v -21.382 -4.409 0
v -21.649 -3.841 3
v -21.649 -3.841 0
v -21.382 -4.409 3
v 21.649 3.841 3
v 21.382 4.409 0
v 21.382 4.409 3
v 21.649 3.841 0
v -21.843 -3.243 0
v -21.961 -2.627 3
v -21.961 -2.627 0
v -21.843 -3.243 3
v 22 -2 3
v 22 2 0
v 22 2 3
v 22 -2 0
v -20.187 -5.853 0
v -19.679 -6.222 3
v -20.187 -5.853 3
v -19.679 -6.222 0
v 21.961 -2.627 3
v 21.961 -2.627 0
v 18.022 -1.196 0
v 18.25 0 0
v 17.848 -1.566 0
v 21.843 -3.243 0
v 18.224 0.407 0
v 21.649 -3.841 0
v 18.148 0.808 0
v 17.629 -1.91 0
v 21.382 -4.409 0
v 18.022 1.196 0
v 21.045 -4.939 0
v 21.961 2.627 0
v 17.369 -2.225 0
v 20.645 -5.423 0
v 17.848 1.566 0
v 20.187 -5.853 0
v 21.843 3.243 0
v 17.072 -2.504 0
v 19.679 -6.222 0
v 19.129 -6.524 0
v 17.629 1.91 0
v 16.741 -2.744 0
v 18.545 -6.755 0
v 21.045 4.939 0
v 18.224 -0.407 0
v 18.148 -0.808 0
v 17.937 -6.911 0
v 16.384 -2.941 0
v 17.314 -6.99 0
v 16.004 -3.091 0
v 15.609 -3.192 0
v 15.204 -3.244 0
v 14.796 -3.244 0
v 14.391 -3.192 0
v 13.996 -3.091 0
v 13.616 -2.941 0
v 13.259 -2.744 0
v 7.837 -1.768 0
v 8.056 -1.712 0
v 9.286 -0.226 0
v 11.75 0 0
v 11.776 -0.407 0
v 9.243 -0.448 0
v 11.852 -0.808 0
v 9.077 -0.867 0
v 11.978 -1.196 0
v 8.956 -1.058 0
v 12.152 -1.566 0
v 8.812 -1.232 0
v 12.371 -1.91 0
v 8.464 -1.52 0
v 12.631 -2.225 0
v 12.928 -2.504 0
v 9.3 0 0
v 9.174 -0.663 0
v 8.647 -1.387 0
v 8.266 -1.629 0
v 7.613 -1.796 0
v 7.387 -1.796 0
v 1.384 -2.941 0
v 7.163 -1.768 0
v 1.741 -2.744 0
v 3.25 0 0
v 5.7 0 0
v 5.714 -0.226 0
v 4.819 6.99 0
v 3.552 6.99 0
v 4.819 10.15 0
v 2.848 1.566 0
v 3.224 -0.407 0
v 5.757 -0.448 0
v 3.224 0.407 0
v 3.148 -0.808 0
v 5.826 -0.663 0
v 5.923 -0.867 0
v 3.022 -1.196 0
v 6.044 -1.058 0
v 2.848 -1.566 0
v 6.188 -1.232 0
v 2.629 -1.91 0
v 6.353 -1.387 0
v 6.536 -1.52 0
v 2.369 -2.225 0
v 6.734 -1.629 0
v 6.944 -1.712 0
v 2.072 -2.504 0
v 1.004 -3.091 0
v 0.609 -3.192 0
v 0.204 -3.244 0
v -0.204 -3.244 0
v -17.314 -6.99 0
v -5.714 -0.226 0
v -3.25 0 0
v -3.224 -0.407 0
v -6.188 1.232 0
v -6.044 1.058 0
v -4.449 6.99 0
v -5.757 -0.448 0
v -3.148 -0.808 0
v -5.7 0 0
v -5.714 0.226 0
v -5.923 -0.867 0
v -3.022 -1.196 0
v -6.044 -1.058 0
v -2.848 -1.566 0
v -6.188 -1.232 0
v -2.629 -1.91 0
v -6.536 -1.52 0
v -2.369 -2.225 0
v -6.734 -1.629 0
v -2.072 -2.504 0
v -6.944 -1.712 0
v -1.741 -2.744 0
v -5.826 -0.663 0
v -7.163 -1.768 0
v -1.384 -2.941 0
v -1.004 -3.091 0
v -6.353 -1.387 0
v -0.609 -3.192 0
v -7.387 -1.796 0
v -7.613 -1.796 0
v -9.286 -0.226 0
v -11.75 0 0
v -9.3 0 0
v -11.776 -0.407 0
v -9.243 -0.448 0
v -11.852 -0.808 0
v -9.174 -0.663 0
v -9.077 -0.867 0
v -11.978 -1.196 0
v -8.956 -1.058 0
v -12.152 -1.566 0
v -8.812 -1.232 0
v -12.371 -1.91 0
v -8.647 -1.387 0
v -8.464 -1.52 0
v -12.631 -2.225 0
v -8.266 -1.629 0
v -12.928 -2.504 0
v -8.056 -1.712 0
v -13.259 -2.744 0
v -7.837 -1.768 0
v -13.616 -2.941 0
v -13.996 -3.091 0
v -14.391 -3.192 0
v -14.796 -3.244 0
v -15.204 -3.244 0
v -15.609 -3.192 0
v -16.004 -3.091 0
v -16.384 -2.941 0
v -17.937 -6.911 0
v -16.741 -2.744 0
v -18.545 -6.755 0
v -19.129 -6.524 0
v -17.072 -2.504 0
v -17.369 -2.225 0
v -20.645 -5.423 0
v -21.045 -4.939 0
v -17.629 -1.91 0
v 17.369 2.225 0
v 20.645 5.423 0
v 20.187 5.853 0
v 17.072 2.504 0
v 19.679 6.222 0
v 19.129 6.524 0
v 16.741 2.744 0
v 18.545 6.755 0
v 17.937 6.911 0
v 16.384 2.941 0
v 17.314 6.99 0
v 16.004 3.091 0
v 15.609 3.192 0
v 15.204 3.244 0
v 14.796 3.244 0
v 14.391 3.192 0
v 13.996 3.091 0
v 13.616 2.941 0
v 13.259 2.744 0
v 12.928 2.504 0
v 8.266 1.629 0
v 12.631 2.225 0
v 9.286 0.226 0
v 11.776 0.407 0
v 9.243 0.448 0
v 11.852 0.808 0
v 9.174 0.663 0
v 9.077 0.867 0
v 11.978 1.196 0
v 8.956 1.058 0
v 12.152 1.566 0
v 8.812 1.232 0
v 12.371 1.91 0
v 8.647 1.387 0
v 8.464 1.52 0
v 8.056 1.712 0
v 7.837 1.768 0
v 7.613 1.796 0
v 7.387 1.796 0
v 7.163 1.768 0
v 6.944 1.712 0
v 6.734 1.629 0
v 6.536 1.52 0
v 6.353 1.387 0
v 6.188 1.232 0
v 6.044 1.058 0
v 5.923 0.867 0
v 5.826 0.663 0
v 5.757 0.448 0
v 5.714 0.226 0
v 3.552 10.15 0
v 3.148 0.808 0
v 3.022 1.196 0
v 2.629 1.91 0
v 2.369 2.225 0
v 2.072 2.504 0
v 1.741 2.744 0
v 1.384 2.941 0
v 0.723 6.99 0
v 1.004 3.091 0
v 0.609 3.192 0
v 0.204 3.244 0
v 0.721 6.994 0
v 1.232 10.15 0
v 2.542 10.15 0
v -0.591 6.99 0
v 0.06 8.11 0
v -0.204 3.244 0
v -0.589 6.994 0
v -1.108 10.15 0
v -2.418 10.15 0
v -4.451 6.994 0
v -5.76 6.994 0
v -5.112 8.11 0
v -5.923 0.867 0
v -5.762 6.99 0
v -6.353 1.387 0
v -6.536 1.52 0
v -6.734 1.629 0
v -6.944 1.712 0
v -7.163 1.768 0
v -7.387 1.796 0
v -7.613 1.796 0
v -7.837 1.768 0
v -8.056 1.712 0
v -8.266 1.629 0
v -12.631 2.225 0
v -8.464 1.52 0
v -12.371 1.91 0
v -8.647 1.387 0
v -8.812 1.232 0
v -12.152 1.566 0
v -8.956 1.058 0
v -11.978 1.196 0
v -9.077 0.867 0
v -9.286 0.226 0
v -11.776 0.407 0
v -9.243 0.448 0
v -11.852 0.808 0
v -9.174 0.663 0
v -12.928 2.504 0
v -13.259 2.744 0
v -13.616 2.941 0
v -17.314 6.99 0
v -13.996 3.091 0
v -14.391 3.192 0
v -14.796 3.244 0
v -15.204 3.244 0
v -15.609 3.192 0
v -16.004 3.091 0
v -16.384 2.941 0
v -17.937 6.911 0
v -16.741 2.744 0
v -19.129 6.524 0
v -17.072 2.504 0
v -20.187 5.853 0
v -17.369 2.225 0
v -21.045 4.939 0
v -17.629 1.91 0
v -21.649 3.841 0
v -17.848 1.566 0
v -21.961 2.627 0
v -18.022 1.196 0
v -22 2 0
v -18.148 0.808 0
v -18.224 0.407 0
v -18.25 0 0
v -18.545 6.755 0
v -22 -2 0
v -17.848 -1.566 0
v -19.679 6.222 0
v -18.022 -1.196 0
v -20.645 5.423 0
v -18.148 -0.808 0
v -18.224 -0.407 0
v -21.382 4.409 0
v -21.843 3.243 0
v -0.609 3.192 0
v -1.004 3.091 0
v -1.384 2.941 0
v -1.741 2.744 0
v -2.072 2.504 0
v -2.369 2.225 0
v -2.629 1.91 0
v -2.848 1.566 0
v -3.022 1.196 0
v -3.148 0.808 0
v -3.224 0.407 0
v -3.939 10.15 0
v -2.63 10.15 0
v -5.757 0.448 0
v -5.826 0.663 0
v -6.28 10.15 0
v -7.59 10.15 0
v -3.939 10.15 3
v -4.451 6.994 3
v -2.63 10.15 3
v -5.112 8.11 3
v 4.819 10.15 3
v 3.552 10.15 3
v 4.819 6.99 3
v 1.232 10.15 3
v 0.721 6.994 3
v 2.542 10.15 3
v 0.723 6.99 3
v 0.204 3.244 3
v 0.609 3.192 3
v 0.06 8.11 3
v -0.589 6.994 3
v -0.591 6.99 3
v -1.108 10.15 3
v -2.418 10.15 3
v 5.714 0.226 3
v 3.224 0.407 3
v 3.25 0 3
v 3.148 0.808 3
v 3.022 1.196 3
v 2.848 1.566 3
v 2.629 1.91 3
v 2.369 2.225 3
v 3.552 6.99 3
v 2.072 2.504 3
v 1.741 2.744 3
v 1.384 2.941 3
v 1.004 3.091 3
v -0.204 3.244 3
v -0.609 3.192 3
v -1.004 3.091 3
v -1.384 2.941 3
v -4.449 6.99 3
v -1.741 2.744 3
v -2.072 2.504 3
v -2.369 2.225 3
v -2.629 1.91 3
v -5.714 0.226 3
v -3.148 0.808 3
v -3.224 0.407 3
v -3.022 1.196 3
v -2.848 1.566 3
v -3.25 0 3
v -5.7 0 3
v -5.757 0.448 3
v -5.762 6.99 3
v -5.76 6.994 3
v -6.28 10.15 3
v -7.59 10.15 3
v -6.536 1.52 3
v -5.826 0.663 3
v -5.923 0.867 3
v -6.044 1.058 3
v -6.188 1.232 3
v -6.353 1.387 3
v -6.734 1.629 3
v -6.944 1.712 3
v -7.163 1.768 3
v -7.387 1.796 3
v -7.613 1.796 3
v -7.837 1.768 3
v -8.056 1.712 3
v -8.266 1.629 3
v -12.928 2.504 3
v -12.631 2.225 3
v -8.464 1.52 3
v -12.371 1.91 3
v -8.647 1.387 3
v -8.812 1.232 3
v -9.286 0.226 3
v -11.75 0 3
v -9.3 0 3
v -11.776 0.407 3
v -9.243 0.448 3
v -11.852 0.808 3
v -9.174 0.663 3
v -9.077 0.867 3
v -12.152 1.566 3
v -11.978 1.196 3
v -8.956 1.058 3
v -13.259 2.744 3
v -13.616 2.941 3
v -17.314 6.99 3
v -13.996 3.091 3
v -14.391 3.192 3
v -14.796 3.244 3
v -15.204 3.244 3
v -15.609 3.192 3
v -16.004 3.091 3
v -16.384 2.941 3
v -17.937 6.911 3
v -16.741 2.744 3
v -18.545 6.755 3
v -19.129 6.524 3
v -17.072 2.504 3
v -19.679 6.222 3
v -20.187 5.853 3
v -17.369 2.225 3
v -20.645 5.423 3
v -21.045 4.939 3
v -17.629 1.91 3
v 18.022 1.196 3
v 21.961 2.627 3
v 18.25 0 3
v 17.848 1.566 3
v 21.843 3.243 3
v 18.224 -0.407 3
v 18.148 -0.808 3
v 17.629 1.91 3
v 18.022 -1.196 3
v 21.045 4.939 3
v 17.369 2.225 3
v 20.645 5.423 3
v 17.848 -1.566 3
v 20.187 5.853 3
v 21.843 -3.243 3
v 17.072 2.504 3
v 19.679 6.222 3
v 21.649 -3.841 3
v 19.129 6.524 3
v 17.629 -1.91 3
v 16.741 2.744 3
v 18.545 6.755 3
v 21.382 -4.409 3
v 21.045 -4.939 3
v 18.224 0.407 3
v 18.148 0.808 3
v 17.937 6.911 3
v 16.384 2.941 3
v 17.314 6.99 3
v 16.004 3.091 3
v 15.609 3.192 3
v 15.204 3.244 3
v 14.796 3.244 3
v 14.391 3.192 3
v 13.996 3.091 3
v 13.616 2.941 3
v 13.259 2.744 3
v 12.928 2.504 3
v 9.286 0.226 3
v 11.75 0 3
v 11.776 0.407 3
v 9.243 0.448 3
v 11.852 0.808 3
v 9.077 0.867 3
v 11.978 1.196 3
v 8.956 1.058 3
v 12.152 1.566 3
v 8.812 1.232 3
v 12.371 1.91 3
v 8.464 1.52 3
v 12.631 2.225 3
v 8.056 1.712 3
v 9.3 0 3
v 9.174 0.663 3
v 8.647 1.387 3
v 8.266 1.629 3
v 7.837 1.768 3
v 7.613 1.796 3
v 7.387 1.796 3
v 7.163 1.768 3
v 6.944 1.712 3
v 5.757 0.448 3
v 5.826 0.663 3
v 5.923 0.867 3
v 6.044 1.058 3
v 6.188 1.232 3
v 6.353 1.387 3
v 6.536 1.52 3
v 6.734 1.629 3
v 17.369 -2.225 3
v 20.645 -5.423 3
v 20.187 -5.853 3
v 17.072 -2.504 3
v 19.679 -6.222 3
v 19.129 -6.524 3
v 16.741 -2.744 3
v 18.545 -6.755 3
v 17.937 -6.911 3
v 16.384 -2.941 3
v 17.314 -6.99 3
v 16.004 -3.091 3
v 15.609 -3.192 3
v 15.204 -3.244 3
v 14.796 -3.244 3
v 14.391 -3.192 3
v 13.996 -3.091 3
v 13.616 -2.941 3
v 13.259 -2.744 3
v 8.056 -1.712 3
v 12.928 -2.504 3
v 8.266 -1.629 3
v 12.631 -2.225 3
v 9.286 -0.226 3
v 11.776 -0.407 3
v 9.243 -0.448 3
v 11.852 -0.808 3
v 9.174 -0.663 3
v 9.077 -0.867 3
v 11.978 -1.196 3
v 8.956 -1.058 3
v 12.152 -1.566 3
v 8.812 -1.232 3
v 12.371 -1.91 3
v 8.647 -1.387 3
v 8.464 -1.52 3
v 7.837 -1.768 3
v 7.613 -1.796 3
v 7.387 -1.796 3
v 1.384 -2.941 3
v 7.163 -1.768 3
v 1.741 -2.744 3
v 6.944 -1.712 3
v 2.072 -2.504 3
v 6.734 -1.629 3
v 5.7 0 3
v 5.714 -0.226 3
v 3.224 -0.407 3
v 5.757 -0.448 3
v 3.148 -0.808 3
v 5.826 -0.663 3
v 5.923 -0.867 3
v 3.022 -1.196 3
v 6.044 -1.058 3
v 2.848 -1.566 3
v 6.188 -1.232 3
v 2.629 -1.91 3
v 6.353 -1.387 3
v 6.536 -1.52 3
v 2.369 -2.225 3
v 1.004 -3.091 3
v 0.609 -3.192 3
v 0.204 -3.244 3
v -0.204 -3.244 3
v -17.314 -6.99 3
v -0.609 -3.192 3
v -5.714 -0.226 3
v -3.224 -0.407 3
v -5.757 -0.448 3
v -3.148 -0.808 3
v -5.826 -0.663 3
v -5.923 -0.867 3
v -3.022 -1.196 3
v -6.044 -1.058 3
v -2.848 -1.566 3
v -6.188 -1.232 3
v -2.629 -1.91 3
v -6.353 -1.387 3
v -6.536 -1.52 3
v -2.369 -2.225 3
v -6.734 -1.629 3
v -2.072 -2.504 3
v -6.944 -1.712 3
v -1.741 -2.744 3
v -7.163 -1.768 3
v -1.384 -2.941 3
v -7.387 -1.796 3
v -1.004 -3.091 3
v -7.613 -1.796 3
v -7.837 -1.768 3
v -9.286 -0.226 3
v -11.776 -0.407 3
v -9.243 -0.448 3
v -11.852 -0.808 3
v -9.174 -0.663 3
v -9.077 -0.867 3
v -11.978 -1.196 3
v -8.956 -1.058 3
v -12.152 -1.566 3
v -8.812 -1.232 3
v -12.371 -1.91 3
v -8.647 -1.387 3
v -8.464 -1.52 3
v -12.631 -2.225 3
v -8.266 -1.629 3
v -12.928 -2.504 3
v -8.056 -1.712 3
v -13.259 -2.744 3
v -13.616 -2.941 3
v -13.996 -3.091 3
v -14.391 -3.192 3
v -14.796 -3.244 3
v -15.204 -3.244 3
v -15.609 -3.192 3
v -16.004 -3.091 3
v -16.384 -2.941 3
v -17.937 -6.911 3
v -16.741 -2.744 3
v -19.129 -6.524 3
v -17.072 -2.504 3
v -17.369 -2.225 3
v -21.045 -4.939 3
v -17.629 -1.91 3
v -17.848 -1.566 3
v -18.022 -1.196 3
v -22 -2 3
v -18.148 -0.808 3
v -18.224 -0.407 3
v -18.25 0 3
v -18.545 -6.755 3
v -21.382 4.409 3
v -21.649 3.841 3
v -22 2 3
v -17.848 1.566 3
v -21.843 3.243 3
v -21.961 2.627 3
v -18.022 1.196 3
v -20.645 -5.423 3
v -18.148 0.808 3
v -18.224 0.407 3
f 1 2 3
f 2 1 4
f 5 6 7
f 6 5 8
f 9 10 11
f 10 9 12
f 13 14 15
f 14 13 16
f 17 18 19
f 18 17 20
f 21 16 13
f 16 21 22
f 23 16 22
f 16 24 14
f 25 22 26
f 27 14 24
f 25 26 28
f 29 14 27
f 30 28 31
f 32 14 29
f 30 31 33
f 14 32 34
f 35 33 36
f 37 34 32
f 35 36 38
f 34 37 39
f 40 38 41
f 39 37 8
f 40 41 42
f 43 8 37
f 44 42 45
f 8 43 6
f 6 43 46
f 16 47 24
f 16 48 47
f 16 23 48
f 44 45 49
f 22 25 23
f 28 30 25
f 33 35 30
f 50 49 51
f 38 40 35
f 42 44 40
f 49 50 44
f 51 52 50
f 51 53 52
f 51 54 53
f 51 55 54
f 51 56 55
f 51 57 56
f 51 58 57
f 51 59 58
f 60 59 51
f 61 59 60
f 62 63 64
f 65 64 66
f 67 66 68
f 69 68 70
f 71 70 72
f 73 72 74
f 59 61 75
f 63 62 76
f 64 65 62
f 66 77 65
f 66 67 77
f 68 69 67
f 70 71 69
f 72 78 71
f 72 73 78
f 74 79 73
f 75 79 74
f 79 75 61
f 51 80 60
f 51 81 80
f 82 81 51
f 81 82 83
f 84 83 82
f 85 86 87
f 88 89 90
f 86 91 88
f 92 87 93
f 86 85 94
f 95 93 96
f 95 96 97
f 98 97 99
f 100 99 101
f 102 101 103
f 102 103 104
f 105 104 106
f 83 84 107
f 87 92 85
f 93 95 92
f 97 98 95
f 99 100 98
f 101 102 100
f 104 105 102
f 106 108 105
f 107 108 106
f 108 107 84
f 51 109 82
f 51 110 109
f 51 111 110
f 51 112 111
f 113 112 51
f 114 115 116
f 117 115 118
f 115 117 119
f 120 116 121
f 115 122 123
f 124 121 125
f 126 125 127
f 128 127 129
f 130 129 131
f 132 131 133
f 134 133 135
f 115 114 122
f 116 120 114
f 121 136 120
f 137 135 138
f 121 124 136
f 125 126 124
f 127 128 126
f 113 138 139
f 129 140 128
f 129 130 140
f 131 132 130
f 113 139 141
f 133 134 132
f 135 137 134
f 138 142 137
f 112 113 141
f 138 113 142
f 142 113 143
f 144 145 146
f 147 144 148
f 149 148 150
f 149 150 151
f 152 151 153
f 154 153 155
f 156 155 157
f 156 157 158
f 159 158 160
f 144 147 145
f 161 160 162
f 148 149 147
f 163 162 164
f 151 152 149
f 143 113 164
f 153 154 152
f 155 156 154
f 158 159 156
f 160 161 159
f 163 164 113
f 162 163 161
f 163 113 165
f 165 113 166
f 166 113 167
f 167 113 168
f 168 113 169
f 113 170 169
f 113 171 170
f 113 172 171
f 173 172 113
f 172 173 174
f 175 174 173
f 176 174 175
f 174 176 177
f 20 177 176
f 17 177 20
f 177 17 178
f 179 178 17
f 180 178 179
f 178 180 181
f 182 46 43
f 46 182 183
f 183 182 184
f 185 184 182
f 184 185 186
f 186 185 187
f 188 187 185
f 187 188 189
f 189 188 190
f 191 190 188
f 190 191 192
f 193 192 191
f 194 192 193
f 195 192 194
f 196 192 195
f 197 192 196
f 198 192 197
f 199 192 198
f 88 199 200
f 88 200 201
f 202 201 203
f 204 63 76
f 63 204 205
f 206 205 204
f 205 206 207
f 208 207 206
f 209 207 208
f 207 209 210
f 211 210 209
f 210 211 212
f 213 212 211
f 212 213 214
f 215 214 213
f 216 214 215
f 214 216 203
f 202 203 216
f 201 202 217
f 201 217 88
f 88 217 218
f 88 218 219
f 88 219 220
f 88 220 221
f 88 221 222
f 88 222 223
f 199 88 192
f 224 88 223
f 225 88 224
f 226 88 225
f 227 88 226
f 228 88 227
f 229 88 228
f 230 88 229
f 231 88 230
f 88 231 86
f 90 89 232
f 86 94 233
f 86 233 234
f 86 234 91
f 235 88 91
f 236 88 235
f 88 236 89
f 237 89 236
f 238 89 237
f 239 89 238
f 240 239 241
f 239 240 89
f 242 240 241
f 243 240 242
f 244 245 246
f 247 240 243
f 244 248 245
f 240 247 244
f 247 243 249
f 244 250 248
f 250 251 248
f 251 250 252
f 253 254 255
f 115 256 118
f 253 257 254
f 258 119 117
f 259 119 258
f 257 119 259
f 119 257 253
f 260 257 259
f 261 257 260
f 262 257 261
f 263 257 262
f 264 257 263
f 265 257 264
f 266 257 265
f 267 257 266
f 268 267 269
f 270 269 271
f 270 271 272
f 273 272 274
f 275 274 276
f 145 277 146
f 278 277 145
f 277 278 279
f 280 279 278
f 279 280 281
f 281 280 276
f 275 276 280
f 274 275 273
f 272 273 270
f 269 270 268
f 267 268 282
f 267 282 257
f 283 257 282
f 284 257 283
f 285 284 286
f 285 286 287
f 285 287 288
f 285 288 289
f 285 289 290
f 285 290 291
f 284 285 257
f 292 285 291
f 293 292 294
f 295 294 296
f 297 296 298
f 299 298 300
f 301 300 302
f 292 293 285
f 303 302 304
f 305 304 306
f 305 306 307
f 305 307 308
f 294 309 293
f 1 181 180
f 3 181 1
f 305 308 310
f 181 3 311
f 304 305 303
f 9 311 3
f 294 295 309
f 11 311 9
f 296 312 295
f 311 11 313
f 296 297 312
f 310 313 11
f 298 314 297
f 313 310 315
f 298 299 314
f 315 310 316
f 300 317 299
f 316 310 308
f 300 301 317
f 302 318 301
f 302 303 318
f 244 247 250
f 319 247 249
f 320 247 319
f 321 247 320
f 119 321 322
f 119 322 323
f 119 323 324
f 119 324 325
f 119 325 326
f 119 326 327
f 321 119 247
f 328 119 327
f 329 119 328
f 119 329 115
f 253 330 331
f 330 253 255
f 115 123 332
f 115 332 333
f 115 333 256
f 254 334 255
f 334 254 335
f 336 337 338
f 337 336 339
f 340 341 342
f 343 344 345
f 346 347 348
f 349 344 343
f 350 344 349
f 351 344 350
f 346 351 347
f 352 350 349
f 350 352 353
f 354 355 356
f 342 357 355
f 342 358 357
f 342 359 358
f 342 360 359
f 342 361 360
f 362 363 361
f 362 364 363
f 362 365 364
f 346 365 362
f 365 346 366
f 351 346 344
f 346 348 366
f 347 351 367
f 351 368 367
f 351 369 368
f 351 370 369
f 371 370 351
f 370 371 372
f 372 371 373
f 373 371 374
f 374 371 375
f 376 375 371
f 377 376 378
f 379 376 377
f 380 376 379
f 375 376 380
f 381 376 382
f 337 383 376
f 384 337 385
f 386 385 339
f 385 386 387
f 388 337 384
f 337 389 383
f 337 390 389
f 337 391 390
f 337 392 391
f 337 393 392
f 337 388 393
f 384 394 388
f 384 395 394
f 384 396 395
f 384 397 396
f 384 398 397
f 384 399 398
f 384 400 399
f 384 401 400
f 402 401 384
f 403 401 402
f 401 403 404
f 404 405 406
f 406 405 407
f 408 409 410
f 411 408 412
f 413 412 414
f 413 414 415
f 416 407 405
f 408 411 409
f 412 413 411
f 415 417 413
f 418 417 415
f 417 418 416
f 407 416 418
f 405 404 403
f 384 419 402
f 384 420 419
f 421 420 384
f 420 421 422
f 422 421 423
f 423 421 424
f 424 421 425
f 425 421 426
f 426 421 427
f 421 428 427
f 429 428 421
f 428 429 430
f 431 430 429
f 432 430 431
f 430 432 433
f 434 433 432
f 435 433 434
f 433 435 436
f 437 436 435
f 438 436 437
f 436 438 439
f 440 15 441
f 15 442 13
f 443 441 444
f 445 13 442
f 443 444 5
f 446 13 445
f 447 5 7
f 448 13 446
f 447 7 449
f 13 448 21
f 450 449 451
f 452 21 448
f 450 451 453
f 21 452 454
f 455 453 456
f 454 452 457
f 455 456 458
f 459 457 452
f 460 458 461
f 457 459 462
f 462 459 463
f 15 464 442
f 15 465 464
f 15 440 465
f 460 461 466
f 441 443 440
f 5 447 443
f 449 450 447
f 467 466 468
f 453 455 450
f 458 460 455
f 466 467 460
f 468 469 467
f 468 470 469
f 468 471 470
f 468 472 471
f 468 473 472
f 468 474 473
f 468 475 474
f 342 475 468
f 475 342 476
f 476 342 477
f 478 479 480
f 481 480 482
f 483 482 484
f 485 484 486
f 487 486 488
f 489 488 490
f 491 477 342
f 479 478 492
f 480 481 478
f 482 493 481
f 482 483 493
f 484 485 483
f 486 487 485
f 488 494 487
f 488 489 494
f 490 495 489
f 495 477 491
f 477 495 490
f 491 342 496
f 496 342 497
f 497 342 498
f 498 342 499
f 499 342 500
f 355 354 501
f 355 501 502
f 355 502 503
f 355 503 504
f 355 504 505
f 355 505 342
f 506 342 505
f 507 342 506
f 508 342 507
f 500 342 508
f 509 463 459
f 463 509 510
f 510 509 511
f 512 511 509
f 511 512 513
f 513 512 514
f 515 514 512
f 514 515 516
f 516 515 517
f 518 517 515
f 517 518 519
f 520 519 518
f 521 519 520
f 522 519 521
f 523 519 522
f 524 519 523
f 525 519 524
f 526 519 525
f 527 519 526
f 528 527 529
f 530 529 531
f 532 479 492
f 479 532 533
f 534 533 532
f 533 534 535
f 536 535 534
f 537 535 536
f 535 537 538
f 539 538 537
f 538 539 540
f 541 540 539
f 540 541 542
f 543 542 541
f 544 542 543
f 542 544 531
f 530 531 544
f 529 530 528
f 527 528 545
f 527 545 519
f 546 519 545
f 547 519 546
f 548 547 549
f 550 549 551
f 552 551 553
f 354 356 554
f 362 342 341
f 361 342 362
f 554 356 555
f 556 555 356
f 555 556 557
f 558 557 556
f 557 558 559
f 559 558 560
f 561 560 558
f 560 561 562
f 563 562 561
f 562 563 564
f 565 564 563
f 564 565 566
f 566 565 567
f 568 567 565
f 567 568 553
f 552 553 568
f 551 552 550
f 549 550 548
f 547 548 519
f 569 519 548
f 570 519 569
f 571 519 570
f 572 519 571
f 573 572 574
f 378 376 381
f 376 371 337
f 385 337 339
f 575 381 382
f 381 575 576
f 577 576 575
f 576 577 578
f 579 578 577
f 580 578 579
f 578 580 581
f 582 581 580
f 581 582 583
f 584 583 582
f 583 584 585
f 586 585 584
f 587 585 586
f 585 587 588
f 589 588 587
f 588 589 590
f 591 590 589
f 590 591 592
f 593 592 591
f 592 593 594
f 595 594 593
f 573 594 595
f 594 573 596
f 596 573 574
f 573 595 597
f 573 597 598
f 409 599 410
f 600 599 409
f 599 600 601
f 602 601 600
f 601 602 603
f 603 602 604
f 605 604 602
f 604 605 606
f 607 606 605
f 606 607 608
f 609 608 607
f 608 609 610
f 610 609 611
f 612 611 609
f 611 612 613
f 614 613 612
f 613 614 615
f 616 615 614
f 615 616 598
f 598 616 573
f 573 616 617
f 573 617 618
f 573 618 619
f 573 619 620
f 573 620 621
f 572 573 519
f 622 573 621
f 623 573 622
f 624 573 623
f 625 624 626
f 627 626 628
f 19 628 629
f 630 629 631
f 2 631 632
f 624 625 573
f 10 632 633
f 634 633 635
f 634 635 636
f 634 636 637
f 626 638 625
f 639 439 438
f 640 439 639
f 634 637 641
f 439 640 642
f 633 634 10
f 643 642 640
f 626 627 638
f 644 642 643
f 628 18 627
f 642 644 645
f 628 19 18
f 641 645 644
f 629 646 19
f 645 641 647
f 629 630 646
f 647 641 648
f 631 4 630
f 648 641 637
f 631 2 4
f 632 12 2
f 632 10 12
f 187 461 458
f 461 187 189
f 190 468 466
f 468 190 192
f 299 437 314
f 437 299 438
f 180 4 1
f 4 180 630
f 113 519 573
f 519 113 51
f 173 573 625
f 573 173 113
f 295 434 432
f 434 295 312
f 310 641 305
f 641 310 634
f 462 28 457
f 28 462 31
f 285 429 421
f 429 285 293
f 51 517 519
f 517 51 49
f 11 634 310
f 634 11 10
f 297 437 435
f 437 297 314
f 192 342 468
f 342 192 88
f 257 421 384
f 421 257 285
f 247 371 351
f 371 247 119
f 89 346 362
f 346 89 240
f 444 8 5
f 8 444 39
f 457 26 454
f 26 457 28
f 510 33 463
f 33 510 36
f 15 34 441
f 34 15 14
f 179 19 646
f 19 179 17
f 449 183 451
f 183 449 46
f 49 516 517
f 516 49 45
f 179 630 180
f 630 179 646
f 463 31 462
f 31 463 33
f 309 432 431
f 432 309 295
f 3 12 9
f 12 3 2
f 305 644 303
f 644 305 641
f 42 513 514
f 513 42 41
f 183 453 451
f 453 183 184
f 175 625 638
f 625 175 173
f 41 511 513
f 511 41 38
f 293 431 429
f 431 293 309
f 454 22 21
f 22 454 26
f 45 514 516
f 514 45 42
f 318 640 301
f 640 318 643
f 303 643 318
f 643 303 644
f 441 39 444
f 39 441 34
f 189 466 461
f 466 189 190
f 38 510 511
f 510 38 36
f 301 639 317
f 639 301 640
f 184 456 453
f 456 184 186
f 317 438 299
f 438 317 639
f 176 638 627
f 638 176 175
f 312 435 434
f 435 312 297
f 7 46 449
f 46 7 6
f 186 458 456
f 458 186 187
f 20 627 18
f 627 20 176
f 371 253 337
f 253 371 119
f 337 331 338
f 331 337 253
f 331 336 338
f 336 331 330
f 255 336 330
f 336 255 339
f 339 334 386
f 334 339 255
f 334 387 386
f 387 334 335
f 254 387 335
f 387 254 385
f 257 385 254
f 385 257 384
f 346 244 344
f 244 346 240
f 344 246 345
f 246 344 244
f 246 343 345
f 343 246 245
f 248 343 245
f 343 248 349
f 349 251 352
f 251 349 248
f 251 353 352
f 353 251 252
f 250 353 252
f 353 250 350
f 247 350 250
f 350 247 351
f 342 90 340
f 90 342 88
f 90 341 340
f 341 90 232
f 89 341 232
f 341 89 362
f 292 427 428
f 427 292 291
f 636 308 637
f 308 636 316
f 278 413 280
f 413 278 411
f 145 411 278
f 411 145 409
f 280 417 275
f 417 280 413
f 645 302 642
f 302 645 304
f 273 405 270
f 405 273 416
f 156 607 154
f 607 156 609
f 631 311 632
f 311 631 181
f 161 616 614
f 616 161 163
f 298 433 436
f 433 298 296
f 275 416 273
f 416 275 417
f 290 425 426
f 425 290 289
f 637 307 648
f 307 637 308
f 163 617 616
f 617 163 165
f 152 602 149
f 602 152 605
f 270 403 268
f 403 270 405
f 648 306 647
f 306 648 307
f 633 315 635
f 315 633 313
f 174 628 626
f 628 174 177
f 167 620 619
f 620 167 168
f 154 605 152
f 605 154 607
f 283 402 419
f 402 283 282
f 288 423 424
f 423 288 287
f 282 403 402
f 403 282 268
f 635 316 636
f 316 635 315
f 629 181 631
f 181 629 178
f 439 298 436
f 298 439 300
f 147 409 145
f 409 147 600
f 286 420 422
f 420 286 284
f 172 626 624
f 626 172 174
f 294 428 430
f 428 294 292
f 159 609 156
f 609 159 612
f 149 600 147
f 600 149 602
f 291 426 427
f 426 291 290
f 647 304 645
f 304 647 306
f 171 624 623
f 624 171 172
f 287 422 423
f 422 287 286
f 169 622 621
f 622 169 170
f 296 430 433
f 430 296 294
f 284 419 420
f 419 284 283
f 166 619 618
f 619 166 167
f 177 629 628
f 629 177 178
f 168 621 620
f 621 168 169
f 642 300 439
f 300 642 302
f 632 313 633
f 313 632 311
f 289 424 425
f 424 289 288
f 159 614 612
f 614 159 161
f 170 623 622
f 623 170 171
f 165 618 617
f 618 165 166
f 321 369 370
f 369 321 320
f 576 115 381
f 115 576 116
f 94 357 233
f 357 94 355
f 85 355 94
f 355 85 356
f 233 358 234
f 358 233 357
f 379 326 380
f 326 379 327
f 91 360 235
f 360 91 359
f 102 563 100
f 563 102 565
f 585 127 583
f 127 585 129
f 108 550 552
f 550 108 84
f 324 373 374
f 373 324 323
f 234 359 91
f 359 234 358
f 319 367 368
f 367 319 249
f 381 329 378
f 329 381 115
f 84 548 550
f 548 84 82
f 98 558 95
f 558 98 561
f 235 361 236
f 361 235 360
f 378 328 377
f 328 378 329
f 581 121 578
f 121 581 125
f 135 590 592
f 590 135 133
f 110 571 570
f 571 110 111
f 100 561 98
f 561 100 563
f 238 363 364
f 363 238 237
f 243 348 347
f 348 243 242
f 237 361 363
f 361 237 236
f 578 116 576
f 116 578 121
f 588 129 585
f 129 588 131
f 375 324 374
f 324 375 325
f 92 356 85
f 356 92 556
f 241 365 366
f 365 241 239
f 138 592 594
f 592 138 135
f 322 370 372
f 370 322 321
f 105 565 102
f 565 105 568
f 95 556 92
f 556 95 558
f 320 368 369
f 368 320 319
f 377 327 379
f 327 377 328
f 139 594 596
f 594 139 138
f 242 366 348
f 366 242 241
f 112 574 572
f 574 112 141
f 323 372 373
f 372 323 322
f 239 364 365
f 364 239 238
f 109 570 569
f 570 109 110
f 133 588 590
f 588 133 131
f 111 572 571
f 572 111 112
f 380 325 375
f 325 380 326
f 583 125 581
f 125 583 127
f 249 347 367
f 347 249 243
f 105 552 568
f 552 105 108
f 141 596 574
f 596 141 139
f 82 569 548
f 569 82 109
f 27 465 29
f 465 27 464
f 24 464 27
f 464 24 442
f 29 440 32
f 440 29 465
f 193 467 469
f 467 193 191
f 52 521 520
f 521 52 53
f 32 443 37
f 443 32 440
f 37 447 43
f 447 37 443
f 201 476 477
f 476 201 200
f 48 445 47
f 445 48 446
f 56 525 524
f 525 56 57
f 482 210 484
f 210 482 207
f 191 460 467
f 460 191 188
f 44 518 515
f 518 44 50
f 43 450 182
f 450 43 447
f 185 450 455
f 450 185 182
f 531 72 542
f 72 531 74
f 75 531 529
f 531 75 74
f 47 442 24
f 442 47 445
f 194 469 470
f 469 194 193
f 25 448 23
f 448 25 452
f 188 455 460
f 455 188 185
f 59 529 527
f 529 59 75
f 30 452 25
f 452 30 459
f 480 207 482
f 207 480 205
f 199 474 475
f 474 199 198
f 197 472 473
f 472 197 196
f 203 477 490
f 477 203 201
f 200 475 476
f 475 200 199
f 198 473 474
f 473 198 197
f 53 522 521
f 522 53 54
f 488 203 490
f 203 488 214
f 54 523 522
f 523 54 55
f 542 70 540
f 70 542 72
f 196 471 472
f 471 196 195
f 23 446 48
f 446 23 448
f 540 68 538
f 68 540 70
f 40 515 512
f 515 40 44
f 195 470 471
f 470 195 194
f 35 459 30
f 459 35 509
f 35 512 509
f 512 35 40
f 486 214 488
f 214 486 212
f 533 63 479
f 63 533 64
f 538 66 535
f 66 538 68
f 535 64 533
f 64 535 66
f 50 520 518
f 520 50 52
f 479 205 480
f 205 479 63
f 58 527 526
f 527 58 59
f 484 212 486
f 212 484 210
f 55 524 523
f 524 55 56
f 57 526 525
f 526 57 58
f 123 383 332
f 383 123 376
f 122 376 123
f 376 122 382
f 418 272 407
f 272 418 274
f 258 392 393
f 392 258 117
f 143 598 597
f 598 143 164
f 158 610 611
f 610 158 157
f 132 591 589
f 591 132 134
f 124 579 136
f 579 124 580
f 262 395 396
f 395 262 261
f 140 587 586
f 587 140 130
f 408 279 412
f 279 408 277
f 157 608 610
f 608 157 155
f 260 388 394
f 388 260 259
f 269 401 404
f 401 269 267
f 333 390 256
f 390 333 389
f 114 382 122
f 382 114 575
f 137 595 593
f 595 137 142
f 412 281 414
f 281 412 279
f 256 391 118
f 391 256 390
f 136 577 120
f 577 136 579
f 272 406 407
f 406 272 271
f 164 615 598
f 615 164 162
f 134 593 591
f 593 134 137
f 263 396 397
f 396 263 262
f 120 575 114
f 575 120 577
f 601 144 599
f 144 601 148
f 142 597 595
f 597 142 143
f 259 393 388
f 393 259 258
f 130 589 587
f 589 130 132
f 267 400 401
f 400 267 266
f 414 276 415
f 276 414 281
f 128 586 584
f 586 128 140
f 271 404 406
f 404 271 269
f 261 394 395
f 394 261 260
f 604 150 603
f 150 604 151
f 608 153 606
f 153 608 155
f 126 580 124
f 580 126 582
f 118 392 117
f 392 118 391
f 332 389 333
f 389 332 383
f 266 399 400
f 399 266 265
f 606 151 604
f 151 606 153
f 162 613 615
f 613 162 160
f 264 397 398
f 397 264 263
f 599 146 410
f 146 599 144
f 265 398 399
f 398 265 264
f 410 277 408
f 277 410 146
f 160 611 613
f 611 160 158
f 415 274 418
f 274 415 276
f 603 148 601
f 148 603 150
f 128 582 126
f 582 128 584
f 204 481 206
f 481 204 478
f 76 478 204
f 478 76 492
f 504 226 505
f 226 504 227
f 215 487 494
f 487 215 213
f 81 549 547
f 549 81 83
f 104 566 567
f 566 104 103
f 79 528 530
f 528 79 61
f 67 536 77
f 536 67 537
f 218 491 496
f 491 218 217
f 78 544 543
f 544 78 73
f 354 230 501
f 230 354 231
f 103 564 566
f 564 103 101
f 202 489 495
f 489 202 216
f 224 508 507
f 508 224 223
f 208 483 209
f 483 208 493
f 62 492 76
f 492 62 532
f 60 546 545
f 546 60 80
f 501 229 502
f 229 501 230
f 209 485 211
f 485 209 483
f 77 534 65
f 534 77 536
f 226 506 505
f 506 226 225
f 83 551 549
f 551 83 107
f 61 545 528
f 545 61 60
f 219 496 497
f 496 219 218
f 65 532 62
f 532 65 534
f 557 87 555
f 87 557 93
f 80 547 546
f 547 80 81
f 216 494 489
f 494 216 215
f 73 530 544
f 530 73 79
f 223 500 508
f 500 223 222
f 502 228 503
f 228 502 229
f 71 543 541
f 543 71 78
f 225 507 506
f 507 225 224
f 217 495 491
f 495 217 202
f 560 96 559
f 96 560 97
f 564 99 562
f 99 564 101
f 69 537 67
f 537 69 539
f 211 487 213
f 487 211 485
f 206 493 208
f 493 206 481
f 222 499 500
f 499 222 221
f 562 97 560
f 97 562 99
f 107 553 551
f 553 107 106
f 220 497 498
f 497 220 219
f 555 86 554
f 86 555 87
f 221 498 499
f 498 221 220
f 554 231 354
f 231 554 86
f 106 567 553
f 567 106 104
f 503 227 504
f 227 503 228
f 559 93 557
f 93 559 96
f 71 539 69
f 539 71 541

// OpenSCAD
$fn = 50;


difference() {
	union() {
		hull() {
			translate(v = [-17.0000000000, 2.0000000000, 0]) {
				cylinder(h = 3, r = 5);
			}
			translate(v = [17.0000000000, 2.0000000000, 0]) {
				cylinder(h = 3, r = 5);
			}
			translate(v = [-17.0000000000, -2.0000000000, 0]) {
				cylinder(h = 3, r = 5);
			}
			translate(v = [17.0000000000, -2.0000000000, 0]) {
				cylinder(h = 3, r = 5);
			}
		}
		translate(v = [0, 10.0000000000, 0]) {
			linear_extrude(height = 3) {
				text(font = "DejaVu Sans Mono:style=Bold", halign = "center", size = 6.3333333333, text = "XXL", valign = "top");
			}
		}
	}
	union() {
		translate(v = [-15.0000000000, 0.0000000000, 0]) {
			translate(v = [0, 0, -100]) {
				cylinder(h = 200, r = 3.2500000000);
			}
		}
		translate(v = [0, 0, -100]) {
			cylinder(h = 200, r = 3.2500000000);
		}
		translate(v = [15.0000000000, 0.0000000000, 0]) {
			translate(v = [0, 0, -100]) {
				cylinder(h = 200, r = 3.2500000000);
			}
		}
		translate(v = [-15.0000000000, 0.0000000000, 0]) {
			translate(v = [0, 0, -100]) {
				cylinder(h = 200, r = 1.8000000000);
			}
		}
		translate(v = [-7.5000000000, 0.0000000000, 0]) {
			translate(v = [0, 0, -100]) {
				cylinder(h = 200, r = 1.8000000000);
			}
		}
		translate(v = [0, 0, -100]) {
			cylinder(h = 200, r = 1.8000000000);
		}
		translate(v = [7.5000000000, 0.0000000000, 0]) {
			translate(v = [0, 0, -100]) {
				cylinder(h = 200, r = 1.8000000000);
			}
		}
		translate(v = [15.0000000000, 0.0000000000, 0]) {
			translate(v = [0, 0, -100]) {
				cylinder(h = 200, r = 1.8000000000);
			}
		}
	}
}
